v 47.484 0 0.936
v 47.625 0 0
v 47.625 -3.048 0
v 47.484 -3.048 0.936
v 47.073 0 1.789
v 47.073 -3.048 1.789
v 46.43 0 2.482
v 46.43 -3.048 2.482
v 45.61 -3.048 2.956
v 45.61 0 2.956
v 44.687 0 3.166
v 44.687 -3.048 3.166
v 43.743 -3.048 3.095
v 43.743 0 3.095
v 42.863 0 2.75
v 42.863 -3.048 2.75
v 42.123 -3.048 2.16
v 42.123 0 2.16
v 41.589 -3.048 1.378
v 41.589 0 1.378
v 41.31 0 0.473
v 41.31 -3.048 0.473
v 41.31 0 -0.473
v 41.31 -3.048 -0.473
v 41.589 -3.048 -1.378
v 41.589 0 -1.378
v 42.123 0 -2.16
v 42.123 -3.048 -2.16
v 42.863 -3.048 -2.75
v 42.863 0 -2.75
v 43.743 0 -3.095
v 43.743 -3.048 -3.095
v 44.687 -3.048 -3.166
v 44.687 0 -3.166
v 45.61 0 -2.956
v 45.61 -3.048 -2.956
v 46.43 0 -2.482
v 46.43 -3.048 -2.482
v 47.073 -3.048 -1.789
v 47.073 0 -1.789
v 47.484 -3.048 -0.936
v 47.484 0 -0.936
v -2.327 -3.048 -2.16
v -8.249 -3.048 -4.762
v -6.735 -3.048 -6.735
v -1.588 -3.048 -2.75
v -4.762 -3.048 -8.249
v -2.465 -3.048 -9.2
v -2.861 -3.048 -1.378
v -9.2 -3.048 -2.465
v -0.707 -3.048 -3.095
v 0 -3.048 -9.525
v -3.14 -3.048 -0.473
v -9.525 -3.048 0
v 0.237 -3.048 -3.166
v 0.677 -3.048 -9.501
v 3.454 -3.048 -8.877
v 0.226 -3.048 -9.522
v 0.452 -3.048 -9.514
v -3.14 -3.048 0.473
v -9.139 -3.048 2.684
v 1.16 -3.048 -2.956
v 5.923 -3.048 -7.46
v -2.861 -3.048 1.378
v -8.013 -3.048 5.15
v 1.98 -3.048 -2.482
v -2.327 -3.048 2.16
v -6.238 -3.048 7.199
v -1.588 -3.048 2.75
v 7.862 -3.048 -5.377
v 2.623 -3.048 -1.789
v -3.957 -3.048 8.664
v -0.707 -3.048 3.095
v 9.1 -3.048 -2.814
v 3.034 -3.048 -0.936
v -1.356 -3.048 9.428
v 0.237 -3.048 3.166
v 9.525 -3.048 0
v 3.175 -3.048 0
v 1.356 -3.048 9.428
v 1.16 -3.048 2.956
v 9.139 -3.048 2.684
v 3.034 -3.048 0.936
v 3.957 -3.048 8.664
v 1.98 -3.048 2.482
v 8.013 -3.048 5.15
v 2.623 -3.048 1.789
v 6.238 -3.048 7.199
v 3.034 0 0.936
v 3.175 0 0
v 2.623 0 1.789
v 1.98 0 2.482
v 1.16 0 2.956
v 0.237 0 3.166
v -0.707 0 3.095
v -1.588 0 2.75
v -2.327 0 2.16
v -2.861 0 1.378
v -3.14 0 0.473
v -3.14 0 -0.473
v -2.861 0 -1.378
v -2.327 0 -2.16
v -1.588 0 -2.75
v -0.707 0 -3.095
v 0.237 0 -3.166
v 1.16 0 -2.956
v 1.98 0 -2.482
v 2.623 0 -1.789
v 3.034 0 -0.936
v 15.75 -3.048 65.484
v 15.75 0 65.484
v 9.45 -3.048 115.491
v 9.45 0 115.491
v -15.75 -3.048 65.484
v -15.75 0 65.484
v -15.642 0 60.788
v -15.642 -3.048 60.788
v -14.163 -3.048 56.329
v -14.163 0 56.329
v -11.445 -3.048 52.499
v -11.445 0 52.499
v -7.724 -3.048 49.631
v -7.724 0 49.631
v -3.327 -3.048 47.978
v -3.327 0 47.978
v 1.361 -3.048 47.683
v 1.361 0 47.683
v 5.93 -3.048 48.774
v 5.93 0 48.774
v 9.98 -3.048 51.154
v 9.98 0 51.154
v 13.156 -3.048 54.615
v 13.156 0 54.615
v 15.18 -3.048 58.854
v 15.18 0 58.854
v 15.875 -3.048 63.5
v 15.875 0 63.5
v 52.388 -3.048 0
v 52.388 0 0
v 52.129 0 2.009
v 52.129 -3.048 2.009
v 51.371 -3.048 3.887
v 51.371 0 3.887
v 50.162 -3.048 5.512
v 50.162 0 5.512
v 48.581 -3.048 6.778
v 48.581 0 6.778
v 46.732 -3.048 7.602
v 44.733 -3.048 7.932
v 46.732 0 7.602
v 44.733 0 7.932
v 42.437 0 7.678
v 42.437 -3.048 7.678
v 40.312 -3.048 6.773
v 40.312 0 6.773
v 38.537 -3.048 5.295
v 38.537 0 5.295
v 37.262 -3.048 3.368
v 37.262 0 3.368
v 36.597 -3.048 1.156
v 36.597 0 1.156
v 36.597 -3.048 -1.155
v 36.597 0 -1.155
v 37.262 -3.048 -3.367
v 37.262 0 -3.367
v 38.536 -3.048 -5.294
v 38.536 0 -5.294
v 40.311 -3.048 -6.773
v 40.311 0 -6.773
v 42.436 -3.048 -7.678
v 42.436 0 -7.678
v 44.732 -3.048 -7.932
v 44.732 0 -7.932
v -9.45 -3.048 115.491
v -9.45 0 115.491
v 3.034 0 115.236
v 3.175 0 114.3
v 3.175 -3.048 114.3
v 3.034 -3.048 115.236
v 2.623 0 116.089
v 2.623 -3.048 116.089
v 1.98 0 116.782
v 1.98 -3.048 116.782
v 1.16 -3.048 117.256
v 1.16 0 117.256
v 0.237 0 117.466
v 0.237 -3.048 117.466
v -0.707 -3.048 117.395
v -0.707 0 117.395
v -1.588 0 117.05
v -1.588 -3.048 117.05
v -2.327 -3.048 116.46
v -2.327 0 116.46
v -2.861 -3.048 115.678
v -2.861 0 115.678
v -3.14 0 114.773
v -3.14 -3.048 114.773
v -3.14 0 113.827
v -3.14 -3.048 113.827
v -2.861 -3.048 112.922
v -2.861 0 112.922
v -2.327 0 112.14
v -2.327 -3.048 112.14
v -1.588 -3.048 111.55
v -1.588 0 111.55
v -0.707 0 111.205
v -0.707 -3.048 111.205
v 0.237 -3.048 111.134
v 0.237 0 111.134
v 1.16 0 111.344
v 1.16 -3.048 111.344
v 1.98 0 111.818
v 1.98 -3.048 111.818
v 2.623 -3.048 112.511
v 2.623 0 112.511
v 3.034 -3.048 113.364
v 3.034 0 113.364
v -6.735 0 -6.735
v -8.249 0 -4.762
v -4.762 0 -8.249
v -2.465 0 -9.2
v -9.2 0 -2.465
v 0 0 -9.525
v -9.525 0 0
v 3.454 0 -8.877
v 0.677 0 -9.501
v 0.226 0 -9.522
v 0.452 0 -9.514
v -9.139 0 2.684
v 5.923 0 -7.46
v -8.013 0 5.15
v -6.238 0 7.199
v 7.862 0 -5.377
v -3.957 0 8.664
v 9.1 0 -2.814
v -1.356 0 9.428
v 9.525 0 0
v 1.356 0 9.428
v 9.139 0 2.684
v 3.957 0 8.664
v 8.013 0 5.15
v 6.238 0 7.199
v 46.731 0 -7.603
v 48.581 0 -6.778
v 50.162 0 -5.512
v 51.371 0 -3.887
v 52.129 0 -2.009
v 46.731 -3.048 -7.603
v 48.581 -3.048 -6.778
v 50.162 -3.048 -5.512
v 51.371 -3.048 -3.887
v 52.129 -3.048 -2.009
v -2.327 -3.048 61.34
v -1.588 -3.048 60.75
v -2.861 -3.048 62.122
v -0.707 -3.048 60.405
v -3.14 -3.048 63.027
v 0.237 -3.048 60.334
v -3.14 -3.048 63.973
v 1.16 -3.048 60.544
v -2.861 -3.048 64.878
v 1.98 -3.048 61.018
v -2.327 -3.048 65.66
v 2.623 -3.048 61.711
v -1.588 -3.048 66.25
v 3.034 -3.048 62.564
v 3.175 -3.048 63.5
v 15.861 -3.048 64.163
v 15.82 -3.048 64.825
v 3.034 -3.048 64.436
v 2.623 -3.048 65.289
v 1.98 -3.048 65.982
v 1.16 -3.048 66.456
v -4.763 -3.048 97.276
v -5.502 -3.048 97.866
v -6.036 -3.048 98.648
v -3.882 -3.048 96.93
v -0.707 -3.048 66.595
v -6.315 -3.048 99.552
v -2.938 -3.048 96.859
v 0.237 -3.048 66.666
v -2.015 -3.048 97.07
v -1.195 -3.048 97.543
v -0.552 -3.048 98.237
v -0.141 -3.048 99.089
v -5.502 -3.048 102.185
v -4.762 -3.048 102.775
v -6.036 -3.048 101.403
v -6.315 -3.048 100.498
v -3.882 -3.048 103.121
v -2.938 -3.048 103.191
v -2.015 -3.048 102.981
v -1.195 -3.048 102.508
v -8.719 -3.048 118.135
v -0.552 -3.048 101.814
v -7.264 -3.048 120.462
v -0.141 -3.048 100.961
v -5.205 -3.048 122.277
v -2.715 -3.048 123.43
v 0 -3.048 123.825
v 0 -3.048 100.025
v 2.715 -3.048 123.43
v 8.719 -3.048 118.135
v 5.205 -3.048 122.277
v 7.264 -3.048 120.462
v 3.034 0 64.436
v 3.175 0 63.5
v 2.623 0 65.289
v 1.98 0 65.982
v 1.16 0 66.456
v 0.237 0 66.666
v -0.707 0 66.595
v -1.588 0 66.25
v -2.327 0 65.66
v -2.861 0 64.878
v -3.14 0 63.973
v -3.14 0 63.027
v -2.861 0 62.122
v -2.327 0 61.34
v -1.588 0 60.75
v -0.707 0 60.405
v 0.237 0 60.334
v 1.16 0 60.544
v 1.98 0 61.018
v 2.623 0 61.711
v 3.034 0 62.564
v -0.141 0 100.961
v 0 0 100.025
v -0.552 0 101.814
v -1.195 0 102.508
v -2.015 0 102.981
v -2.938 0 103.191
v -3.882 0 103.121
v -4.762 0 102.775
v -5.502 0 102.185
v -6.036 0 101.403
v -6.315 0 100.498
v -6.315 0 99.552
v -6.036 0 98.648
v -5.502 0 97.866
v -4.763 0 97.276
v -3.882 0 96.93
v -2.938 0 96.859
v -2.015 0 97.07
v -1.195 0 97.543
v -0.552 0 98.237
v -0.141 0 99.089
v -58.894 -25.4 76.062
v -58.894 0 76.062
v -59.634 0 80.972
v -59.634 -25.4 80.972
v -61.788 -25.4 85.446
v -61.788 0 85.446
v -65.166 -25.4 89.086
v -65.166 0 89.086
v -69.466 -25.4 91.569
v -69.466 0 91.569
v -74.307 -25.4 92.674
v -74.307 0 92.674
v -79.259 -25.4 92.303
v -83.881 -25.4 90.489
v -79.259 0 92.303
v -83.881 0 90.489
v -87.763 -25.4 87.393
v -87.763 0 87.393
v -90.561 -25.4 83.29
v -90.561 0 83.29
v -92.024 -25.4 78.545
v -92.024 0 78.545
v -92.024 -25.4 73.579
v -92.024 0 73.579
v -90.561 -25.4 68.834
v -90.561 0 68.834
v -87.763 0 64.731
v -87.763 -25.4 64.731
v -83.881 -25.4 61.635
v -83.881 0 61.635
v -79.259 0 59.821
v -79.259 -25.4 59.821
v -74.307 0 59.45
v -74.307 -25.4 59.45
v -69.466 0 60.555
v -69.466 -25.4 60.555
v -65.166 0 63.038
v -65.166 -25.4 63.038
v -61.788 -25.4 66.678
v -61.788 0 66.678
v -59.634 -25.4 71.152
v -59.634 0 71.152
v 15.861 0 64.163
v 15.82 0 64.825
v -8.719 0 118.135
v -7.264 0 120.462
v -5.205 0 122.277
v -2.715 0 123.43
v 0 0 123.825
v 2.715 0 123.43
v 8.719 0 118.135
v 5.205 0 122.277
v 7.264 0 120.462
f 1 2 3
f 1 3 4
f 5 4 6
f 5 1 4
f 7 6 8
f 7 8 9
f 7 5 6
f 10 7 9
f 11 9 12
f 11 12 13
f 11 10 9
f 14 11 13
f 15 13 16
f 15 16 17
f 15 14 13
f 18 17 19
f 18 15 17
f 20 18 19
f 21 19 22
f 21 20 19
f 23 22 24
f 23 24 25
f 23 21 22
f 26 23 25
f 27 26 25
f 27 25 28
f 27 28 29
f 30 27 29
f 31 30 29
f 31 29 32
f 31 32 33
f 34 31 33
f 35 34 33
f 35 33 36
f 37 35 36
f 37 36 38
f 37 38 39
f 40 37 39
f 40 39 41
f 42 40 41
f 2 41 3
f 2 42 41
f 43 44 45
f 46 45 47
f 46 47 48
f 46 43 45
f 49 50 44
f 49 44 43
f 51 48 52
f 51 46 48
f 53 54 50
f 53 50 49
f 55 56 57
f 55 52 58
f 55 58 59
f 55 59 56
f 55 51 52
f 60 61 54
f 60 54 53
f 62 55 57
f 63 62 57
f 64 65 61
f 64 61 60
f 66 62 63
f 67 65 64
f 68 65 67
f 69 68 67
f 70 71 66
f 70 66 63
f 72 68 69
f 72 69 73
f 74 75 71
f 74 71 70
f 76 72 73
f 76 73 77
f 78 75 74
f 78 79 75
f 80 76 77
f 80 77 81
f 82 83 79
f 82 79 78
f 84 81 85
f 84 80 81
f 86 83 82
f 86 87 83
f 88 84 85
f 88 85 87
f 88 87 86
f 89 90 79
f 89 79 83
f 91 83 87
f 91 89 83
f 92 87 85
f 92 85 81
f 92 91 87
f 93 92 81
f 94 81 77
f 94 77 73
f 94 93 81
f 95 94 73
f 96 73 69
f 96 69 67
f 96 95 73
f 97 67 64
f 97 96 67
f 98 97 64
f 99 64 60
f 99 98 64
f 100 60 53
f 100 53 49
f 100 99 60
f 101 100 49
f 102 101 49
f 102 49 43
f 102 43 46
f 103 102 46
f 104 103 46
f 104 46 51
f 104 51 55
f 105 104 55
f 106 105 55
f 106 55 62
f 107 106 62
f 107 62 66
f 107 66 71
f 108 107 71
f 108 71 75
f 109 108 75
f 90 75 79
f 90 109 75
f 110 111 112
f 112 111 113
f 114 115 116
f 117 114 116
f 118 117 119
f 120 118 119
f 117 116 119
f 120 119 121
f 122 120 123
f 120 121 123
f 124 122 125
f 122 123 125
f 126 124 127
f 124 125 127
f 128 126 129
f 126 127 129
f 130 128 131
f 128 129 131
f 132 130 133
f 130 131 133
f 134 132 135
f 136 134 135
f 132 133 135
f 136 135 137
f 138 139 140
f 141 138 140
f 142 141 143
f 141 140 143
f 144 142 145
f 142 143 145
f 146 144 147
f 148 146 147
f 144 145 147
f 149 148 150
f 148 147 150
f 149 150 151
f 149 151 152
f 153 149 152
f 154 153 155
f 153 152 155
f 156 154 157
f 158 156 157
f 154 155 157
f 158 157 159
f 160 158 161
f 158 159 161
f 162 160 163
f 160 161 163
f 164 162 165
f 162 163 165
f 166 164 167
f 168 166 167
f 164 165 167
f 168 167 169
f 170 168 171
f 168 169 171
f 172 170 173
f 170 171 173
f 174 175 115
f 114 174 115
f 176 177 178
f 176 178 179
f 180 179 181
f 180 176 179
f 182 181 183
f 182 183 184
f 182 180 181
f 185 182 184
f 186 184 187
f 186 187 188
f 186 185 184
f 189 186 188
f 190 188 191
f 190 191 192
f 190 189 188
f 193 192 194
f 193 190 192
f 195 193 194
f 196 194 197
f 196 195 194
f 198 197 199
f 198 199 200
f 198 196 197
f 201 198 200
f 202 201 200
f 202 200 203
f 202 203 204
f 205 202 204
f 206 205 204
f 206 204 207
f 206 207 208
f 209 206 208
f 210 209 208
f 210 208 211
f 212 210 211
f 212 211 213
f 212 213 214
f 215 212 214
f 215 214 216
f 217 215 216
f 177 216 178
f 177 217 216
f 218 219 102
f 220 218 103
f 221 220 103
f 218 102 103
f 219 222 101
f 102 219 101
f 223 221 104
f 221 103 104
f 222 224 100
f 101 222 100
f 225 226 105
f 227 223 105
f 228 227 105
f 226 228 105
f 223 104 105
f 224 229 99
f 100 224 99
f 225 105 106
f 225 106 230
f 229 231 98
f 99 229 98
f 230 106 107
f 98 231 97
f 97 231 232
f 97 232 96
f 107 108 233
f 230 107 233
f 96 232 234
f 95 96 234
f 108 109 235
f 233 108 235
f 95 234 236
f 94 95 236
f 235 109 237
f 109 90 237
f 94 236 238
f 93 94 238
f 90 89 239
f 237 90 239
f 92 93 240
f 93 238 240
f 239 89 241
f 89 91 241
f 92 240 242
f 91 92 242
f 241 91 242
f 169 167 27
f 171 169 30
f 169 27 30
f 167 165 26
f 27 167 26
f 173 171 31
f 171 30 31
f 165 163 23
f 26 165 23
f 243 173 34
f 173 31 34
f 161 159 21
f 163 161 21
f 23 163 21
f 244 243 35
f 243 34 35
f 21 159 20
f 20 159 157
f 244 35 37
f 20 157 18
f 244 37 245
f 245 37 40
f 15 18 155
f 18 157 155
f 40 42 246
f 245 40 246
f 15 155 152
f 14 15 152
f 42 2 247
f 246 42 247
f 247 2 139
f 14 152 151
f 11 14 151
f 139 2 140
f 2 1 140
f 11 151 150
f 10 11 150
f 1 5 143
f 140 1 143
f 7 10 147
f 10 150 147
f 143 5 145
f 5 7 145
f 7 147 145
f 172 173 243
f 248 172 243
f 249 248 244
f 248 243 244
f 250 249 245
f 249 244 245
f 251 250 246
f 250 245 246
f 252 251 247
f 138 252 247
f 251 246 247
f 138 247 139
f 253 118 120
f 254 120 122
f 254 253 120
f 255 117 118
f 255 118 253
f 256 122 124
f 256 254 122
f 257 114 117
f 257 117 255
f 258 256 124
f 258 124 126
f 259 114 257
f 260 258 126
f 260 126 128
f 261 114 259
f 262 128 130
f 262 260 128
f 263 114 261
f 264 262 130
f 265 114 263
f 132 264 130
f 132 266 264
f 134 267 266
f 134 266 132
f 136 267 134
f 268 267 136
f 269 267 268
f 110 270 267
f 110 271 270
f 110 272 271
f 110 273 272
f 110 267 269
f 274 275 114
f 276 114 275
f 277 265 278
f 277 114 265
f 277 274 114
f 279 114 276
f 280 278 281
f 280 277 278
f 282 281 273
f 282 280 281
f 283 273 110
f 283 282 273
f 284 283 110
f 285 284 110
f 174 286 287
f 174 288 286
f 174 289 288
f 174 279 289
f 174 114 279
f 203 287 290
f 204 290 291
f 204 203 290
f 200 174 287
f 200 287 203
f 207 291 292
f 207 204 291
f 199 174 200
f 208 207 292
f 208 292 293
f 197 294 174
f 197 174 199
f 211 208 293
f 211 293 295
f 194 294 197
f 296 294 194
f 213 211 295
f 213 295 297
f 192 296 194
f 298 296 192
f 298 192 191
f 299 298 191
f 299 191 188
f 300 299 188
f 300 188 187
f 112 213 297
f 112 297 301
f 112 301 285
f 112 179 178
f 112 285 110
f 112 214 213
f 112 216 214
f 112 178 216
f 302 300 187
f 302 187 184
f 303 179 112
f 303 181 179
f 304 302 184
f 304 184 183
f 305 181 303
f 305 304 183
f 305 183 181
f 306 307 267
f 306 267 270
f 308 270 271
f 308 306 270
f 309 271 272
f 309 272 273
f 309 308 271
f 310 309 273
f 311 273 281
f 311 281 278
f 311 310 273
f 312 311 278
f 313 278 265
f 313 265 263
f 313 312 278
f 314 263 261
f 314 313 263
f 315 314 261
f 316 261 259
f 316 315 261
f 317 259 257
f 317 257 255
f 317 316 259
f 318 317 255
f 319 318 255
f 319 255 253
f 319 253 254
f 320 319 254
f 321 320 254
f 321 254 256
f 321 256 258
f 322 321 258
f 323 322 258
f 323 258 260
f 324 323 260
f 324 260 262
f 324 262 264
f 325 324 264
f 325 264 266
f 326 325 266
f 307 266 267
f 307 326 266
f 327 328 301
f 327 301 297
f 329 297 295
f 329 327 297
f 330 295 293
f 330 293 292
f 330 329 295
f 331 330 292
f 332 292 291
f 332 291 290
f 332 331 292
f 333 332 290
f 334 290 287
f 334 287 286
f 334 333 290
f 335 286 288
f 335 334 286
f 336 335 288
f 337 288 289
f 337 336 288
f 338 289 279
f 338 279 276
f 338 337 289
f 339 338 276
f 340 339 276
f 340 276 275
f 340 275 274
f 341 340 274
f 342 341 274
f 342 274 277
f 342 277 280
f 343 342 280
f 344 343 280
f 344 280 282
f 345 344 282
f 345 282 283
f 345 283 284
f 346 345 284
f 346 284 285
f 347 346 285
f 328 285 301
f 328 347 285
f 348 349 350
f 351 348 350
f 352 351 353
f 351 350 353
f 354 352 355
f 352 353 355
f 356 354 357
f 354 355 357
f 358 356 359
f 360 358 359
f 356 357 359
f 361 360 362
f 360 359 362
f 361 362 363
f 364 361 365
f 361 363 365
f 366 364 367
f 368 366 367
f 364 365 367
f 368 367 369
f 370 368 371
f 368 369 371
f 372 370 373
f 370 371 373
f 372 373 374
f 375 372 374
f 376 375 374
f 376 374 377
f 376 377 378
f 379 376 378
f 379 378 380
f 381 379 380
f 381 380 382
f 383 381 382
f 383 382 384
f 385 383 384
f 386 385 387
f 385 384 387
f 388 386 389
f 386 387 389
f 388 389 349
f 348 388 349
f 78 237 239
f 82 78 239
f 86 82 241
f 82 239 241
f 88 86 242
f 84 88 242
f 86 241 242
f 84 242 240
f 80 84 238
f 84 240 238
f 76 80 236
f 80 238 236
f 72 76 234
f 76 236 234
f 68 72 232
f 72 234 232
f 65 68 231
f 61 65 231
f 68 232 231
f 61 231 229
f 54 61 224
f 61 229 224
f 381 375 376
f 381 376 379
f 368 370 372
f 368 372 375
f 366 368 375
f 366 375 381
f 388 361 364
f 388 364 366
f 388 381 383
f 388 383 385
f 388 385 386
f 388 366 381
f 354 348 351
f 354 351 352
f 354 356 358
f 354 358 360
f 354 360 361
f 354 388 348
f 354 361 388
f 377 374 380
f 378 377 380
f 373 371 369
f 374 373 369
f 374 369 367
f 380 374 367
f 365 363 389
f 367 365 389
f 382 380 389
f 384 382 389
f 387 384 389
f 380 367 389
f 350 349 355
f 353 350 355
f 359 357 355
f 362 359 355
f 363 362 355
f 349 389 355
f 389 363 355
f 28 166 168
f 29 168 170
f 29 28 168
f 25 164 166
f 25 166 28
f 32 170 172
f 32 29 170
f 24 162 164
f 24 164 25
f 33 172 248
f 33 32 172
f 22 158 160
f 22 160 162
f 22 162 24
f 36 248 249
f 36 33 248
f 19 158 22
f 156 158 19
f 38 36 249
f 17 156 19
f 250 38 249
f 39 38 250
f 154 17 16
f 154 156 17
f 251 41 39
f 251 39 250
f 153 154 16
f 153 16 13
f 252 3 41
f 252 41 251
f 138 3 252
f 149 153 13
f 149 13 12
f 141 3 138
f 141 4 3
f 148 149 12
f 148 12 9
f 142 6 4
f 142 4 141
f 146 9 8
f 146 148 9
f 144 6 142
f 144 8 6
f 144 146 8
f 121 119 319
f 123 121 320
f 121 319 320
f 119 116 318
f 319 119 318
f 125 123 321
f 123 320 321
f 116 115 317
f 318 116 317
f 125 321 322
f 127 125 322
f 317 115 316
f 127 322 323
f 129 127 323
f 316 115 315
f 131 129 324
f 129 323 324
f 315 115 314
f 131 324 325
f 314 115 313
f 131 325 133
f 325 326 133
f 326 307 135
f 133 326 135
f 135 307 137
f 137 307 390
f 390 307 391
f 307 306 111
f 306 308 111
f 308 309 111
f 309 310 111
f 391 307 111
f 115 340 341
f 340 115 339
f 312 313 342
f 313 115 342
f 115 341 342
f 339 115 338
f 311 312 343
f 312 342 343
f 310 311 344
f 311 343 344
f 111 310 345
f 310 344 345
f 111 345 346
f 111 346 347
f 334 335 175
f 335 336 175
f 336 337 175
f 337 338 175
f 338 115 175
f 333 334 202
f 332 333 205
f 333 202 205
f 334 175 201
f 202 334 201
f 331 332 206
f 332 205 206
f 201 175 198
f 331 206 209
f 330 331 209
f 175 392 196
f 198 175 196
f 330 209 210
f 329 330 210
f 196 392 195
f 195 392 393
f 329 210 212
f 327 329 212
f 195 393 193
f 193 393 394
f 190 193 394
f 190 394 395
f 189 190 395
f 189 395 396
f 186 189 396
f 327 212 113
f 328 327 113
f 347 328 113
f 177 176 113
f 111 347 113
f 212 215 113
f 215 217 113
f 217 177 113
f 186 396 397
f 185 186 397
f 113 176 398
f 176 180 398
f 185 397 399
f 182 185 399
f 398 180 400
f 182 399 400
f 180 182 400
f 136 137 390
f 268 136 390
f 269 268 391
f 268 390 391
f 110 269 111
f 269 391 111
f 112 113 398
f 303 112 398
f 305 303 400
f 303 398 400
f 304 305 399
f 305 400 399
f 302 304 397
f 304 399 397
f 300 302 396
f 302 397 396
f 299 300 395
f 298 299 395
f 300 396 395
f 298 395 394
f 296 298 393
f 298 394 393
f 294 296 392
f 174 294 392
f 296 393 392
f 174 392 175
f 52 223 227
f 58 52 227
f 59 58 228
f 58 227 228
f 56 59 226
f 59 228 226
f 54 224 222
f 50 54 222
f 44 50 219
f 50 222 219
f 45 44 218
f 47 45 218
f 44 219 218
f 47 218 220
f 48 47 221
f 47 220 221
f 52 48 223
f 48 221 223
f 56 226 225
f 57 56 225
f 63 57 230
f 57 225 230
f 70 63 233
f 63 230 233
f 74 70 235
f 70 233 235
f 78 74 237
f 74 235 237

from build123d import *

# Parameters (mm, degrees)
F0_R     = 3.175
F1_DEPTH = 3.048
F2_R     = 16.658386
F3_DEPTH = 25.4


with BuildPart() as f1:
    # F0 (on Front) → F1 (new body)
    with BuildSketch(Plane.XZ):
        with BuildLine():
            ThreePointArc((-9.450293, 115.490625), (-0.596483, 104.793695), (9.525, 114.3))
            ThreePointArc((9.525, 114.3), (9.506305, 114.896483), (9.450293, 115.490625))
            ThreePointArc((9.450293, 115.490625), (0, 123.825), (-9.450293, 115.490625))
        make_face()
        with Locations((0, 114.3)):
            Circle(F0_R, mode=Mode.SUBTRACT)
        with BuildLine():
            ThreePointArc((9.450293, 115.490625), (9.506305, 114.896483), (9.525, 114.3))
            ThreePointArc((9.525, 114.3), (-0.596483, 104.793695), (-9.450293, 115.490625))
            Line((-9.450293, 115.490625), (-15.750488, 65.484375))
            ThreePointArc((-15.750488, 65.484375), (0, 79.375), (15.750488, 65.484375))
            Line((15.750488, 65.484375), (9.450293, 115.490625))
        make_face()
        with Locations((-3.175, 100.0252)):
            Circle(F0_R, mode=Mode.SUBTRACT)
        with BuildLine():
            ThreePointArc((15.875, 63.5), (15.843841, 64.494139), (15.750488, 65.484375))
            ThreePointArc((15.750488, 65.484375), (0, 79.375), (-15.750488, 65.484375))
            ThreePointArc((-15.750488, 65.484375), (-0.994139, 47.656159), (15.875, 63.5))
        make_face()
        with Locations((0, 63.5)):
            Circle(F0_R, mode=Mode.SUBTRACT)
        with BuildLine():
            ThreePointArc((0.677344, -9.500886), (6.970557, -6.491299), (9.525, 0))
            ThreePointArc((9.525, 0), (0, 9.525), (-9.525, 0))
            ThreePointArc((-9.525, 0), (-6.735192, -6.735192), (0, -9.525))
            Line((0, -9.525), (0.677344, -9.500886))
        make_face()
        Circle(F0_R, mode=Mode.SUBTRACT)
        with BuildLine():
            ThreePointArc((44.733482, 7.932436), (36.5125, 0.000539), (44.732405, -7.932475))
            ThreePointArc((44.732405, -7.932475), (50.161633, -5.51191), (52.3875, 0))
            ThreePointArc((52.3875, 0), (50.162007, 5.511523), (44.733482, 7.932436))
        make_face()
        with Locations((44.45, 0)):
            Circle(F0_R, mode=Mode.SUBTRACT)
        with BuildLine():
            ThreePointArc((0, -9.525), (0.338886, -9.51897), (0.677344, -9.500886))
            Line((0.677344, -9.500886), (0, -9.525))
        make_face()
    extrude(amount=F1_DEPTH)


with BuildPart() as f3:
    # F2 (on Front) → F3 (new body)
    with BuildSketch(Plane.XZ):
        with Locations((-75.551987, 76.062046)):
            Circle(F2_R)
    extrude(amount=F3_DEPTH)


solid = Compound([f1.part, f3.part])
